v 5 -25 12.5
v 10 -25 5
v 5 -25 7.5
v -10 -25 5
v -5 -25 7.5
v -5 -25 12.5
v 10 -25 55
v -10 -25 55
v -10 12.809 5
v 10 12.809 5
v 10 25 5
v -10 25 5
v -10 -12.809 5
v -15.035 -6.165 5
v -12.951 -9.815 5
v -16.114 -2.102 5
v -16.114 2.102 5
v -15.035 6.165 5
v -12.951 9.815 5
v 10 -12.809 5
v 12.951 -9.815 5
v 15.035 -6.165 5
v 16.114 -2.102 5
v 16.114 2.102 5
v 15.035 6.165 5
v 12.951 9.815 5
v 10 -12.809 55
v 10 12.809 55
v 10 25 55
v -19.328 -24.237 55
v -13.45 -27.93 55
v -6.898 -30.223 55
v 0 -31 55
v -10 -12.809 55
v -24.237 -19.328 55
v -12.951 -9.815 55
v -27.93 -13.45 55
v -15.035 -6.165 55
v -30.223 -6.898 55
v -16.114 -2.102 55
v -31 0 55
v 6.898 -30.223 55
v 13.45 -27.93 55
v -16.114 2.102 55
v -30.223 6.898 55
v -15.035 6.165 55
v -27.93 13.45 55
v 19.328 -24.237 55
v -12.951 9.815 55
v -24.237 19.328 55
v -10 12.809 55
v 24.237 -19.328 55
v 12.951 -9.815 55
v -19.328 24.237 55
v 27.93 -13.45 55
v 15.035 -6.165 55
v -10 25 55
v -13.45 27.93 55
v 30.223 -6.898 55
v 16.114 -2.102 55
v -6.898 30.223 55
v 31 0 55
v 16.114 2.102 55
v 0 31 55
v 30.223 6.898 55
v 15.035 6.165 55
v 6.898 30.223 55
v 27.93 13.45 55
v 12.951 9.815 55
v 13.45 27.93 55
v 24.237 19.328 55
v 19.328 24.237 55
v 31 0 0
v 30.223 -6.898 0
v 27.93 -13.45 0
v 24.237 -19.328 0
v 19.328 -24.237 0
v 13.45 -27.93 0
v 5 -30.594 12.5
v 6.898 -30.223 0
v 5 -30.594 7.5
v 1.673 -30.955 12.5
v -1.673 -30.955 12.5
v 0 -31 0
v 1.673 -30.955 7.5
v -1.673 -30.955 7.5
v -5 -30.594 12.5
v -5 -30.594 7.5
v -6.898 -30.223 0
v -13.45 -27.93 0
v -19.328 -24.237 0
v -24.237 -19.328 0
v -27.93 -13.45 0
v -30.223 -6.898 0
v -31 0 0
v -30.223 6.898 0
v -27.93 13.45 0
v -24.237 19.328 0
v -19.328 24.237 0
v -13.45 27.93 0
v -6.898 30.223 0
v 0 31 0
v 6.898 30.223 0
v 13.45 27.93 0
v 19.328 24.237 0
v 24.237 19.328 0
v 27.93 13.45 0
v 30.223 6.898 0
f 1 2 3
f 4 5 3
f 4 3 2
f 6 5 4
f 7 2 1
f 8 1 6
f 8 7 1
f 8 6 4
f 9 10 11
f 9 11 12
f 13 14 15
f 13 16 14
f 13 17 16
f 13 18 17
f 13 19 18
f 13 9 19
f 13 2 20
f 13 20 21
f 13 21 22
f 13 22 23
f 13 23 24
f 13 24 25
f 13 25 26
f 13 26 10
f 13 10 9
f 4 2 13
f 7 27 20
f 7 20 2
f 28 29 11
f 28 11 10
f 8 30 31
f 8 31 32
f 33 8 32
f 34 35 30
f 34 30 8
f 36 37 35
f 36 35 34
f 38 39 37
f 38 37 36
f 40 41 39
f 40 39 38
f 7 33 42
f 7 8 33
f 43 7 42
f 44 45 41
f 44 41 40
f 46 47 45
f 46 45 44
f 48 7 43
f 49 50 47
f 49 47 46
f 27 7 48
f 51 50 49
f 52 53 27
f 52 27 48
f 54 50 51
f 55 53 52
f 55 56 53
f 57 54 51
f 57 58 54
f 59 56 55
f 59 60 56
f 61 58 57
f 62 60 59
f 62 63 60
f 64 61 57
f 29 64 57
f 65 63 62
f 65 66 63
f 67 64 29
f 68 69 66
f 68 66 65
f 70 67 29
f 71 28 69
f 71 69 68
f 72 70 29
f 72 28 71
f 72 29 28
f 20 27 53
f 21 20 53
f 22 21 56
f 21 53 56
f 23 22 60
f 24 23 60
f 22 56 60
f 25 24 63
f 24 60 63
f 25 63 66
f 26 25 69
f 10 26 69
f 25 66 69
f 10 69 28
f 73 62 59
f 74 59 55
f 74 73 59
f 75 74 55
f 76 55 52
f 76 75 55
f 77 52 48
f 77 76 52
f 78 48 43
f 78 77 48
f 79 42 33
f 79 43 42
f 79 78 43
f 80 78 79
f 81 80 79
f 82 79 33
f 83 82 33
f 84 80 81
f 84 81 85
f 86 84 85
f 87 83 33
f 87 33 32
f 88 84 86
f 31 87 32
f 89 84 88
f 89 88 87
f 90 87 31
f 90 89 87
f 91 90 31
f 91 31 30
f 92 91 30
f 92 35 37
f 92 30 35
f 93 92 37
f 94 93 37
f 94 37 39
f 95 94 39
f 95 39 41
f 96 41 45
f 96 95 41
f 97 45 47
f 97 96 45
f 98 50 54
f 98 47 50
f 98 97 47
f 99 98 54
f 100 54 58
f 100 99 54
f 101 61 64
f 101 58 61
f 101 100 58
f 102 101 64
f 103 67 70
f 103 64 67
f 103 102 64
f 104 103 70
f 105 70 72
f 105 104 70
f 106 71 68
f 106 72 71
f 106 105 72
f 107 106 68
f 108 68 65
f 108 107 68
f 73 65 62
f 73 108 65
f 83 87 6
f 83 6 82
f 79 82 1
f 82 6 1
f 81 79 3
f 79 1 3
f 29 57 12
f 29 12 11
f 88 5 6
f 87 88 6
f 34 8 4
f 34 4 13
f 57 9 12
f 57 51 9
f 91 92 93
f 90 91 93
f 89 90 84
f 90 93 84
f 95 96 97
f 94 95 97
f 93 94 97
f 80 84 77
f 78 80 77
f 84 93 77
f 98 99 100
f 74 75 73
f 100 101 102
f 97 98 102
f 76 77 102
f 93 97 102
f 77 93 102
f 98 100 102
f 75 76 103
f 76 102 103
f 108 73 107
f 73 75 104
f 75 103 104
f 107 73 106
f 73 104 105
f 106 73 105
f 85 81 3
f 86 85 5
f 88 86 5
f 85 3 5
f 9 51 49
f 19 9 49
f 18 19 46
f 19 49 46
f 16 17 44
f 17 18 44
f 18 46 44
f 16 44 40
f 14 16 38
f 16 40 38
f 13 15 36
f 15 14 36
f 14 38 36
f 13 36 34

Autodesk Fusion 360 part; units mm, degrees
sketch "Sketch1" plane through (0, 0, 0) normal (0, 0, 1) x (1, 0, 0)
  circle A0 centre (0, 0) radius 31
  dimension "d1" = 62
extrude "Extrude1" add sketch "Sketch1" along normal blind 55
sketch "Sketch2" plane through (0, 0, 55) normal (0, 0, 1) x (-1, 0, 0)
  circle A0 centre (0, 0) radius 31
  circle A1 centre (0, 0) radius 16.25
  dimension "d4" = 32.5
extrude "Extrude2" cut sketch "Sketch2" against normal blind 50 contours A1
sketch "Sketch3" plane through (0, 0, 55) normal (0, 0, 1) x (-1, 0, 0)
  circle A0 centre (0, 0) radius 16.25
  circle A1 centre (0, 0) radius 31
  line L0 (10, -25) -> (-10, -25)
  line L1 (-10, -25) -> (-10, 25)
  line L2 (-10, 25) -> (10, 25)
  line L3 (10, 25) -> (10, -25)
  line L4 (10, -25) -> (-10, 25) construction
  line L5 (-10, -25) -> (10, 25) construction
  dimension "d7" = 20
  dimension "d8" = 50
extrude "Extrude3" cut sketch "Sketch3" against normal blind 50 contours A0 L1 L2 L3 | A0 L0 L1 L3
sketch "Sketch4" plane through (0, -25, 0) normal (0, 1, 0) x (-1, 0, 0)
  line L0 (10, 55) -> (-10, 55)
  line L1 (-10, 55) -> (-10, 5)
  line L2 (-10, 5) -> (10, 5)
  line L3 (10, 5) -> (10, 55)
  line L4 (5, 12.5) -> (-5, 12.5)
  line L5 (-5, 12.5) -> (-5, 7.5)
  line L6 (-5, 7.5) -> (5, 7.5)
  line L7 (5, 7.5) -> (5, 12.5)
  line L8 (5, 12.5) -> (-5, 7.5) construction
  line L9 (-5, 12.5) -> (5, 7.5) construction
  point P0 (0, 10)
  dimension "d11" = 10
  dimension "d12" = 5
extrude "Extrude4" cut sketch "Sketch4" against normal blind 8 contours L4 L5 L6 L7
